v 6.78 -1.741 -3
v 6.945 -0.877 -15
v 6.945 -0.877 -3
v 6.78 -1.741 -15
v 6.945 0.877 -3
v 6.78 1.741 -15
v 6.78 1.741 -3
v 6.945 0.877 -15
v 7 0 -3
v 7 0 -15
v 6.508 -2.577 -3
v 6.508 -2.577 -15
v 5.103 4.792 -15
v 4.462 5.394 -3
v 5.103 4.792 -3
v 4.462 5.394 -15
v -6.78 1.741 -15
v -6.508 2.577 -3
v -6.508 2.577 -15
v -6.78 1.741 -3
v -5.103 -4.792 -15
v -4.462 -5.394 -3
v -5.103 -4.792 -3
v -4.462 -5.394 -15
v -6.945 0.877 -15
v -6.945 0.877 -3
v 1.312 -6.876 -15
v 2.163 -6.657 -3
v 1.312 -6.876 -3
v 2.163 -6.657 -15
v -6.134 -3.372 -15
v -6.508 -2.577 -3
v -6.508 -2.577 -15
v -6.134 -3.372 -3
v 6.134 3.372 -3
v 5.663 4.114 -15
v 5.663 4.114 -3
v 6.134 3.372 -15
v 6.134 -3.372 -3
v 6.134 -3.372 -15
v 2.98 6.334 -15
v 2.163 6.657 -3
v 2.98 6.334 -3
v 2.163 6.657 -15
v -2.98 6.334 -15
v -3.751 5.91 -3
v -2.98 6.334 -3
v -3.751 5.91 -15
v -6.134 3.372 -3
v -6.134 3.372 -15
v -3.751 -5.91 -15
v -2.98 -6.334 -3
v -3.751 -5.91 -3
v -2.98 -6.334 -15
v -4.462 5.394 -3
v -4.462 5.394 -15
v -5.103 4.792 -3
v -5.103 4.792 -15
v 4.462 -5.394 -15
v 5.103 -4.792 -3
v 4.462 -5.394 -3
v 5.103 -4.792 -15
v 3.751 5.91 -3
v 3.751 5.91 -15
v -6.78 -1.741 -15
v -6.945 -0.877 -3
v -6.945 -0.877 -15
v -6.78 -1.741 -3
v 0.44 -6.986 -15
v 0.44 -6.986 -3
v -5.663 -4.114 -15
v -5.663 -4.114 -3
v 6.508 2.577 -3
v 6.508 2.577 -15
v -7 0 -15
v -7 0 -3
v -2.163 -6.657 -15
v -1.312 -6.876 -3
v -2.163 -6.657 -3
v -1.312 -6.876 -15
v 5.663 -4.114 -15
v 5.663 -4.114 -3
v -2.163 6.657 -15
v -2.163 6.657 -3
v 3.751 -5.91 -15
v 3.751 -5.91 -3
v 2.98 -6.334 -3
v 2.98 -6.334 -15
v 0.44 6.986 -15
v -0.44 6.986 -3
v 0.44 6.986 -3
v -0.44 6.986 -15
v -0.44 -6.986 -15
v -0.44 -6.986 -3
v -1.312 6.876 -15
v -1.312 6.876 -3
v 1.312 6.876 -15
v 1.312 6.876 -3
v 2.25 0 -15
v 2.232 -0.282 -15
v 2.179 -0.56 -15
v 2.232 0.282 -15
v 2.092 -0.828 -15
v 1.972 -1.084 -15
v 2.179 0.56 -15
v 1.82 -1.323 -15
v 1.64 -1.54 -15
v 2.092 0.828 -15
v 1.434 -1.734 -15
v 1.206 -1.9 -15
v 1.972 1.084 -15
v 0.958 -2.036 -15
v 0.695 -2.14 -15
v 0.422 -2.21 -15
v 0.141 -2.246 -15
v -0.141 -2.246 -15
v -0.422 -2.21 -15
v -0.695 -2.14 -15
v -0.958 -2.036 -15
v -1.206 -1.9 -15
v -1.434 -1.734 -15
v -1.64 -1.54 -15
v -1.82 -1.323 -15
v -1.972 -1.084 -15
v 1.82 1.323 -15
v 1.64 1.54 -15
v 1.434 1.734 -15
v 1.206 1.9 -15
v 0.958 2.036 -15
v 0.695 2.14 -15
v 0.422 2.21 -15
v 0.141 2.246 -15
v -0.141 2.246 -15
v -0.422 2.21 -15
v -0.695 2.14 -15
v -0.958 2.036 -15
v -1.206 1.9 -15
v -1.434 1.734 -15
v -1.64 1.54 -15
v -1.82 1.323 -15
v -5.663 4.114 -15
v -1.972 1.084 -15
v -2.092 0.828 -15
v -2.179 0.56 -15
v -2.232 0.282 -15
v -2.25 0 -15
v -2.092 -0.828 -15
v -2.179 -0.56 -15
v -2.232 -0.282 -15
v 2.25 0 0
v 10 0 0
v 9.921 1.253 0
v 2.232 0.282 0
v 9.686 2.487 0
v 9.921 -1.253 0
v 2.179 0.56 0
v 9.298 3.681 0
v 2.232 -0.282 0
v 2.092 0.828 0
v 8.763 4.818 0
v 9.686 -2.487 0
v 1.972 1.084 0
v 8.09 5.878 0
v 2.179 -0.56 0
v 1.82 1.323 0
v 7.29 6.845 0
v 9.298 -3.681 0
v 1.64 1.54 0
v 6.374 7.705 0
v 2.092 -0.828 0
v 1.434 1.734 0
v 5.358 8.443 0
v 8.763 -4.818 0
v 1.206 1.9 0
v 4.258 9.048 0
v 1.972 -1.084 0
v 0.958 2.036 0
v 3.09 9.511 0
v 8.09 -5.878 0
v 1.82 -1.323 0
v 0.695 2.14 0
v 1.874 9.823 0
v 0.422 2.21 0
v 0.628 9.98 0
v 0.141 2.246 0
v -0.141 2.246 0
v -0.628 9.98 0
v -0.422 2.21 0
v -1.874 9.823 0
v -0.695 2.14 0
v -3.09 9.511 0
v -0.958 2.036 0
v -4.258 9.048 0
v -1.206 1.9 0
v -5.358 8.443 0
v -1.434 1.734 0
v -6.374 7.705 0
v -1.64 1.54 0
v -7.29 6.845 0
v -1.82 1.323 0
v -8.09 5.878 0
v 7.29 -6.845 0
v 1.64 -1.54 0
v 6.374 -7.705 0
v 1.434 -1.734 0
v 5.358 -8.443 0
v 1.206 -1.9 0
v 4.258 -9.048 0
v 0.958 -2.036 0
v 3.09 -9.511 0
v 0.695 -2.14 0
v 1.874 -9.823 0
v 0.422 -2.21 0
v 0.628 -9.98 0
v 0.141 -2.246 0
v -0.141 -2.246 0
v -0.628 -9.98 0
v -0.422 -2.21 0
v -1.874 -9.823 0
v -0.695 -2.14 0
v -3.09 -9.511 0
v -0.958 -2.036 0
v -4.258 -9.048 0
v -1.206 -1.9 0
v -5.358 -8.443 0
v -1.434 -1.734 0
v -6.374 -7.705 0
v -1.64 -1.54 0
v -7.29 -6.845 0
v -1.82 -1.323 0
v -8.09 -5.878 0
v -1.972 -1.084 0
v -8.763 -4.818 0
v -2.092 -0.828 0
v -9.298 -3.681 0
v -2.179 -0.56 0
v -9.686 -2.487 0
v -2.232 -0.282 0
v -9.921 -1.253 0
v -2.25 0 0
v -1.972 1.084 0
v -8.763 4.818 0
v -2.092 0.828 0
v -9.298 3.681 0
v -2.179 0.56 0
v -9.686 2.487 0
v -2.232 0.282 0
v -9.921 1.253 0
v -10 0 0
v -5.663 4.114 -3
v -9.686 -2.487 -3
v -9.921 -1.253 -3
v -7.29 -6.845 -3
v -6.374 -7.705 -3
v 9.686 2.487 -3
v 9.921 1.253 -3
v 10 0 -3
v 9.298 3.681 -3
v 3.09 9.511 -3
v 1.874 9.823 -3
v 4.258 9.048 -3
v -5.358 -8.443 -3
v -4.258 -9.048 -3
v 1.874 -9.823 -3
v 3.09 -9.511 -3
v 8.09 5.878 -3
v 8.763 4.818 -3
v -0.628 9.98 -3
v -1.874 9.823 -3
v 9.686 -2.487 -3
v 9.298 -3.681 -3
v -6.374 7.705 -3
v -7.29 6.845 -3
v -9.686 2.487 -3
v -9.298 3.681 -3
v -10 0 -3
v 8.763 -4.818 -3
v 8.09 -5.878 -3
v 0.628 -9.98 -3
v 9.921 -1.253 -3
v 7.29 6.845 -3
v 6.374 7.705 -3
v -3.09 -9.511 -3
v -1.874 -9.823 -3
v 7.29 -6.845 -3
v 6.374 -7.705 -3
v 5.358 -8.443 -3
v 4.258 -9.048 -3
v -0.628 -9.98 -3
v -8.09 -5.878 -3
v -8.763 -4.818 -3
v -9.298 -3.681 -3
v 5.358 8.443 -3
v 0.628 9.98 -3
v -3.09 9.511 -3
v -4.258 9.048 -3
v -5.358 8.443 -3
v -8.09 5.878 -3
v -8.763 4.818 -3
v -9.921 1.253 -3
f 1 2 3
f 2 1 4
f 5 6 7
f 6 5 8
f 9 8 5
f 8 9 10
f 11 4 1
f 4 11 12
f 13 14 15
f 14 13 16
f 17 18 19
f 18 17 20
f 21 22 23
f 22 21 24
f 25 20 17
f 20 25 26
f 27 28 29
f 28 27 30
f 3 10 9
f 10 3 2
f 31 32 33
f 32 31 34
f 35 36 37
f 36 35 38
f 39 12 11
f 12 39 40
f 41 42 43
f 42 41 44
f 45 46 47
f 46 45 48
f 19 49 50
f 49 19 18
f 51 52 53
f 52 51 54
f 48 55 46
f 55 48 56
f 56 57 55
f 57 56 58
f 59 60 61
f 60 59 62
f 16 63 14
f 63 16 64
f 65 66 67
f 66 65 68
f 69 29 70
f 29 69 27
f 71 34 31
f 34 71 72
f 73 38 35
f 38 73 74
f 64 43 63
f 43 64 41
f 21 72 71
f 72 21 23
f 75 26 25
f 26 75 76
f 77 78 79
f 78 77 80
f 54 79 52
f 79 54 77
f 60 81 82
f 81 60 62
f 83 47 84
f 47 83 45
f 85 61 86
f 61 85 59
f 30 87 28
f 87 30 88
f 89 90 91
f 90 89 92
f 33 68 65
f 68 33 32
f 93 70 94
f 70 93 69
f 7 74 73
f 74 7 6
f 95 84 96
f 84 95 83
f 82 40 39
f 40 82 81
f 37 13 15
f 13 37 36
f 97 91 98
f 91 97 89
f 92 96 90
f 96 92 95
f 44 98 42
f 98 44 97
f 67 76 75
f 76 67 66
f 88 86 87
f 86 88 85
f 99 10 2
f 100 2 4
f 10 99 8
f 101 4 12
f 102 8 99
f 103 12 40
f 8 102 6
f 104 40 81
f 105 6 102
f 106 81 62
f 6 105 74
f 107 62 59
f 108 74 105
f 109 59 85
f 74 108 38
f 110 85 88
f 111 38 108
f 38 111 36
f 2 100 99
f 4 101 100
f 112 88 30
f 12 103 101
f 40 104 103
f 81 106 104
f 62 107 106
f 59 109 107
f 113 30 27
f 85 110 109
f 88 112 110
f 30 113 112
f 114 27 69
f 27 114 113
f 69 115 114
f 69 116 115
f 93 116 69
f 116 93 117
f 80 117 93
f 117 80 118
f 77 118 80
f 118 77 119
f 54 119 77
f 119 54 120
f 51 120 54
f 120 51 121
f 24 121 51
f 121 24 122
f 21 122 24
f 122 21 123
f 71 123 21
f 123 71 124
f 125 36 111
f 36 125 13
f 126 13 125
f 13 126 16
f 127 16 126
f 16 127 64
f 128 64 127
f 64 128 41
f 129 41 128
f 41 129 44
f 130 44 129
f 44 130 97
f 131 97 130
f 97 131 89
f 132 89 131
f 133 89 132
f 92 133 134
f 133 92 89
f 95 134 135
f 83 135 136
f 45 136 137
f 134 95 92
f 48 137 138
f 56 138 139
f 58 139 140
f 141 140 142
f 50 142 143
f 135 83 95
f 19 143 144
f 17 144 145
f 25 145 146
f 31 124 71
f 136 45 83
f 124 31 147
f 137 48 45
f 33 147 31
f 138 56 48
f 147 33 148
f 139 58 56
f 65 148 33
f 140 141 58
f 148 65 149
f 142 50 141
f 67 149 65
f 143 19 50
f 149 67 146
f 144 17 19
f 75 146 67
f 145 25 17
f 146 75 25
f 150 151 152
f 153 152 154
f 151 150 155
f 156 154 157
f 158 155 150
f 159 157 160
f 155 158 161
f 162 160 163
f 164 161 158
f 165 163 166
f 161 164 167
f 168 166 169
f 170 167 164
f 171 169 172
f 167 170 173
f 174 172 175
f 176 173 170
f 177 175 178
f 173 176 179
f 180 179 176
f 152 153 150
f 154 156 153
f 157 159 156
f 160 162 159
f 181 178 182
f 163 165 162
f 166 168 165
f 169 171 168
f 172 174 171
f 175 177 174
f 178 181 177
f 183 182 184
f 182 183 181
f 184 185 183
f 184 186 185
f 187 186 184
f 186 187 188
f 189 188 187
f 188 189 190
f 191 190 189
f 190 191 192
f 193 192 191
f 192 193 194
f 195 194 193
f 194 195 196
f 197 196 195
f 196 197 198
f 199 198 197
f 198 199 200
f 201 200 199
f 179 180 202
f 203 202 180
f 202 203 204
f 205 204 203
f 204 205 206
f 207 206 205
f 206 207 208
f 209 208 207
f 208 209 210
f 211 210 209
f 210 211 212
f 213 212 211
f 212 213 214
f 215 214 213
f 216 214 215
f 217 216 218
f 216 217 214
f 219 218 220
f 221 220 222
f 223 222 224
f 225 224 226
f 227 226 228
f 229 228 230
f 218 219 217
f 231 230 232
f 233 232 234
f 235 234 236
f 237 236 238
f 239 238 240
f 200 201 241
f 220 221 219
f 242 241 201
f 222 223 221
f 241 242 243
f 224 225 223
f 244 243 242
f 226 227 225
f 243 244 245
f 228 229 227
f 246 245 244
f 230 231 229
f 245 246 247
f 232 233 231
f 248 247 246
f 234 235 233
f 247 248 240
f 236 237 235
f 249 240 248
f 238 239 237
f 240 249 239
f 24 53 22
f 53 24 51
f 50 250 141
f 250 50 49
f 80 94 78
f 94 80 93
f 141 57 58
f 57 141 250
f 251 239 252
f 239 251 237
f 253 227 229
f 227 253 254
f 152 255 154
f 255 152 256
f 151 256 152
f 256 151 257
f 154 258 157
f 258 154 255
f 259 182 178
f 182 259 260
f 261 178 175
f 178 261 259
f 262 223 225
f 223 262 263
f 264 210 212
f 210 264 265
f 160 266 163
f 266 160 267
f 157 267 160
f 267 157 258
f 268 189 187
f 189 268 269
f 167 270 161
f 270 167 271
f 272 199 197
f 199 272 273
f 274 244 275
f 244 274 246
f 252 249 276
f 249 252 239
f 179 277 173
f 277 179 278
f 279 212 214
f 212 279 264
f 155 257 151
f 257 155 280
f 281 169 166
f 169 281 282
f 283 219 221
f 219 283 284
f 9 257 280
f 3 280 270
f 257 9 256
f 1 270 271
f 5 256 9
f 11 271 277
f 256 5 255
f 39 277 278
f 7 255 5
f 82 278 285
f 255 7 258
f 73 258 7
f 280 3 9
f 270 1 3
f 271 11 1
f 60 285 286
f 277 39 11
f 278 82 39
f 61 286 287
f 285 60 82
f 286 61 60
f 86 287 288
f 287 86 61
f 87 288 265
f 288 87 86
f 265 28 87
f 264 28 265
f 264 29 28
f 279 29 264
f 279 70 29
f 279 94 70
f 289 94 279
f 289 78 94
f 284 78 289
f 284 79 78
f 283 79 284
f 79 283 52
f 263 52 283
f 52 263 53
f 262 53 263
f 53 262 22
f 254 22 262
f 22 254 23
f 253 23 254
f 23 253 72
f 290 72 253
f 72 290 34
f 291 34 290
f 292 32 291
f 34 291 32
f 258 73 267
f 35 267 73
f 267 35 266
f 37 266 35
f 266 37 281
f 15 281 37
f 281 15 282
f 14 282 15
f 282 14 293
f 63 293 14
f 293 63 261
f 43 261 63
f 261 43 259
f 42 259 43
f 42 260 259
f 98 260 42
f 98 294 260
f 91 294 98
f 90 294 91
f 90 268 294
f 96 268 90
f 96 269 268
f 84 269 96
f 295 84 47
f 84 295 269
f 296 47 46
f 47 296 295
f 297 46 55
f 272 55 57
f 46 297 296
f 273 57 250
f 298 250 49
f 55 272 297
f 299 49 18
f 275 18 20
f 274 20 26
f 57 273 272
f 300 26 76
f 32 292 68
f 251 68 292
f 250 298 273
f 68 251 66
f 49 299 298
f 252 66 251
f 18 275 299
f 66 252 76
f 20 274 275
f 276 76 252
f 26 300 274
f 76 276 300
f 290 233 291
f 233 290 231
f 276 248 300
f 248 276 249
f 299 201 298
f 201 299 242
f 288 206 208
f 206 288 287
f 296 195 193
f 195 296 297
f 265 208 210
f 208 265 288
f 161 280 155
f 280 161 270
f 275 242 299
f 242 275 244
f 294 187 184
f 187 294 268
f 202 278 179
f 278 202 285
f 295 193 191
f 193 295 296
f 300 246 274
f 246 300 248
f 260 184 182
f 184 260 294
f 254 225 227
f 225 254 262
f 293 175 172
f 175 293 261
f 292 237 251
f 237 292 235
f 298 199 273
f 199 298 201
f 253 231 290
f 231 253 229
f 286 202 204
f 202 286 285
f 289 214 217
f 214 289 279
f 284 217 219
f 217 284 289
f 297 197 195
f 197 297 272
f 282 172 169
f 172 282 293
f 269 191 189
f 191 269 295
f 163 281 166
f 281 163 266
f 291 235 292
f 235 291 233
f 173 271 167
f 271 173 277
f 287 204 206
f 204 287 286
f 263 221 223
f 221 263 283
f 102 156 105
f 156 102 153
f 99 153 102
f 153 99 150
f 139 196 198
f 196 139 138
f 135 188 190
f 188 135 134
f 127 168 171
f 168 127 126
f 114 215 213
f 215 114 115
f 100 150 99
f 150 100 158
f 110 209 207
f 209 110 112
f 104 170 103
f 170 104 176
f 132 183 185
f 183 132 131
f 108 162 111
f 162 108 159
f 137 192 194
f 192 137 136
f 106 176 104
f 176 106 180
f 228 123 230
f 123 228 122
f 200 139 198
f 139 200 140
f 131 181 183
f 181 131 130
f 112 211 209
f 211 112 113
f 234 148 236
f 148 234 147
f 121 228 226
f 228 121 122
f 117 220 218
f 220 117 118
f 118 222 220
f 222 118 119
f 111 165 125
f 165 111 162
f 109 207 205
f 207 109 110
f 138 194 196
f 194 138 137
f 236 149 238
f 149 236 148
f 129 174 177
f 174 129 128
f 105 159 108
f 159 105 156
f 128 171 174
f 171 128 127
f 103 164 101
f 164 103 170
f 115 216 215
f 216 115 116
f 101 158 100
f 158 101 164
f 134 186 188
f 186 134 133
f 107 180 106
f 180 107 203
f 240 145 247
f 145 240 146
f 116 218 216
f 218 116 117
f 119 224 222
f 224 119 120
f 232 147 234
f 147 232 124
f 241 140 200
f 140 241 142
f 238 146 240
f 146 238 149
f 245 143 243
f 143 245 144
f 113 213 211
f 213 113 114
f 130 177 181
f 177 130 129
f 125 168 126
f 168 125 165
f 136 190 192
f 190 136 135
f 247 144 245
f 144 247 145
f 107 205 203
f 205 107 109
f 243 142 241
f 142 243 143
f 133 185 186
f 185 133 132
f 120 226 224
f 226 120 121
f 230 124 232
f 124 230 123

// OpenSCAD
$fn = 50;


difference() {
	union() {
		translate(v = [0, 0, -15.0000000000]) {
			cylinder(h = 15, r = 7.0000000000);
		}
		translate(v = [0, 0, -3.0000000000]) {
			cylinder(h = 3, r = 10.0000000000);
		}
	}
	union() {
		#translate(v = [0, 0, -15]) {
			cylinder(h = 15, r = 2.2500000000);
		}
	}
}
